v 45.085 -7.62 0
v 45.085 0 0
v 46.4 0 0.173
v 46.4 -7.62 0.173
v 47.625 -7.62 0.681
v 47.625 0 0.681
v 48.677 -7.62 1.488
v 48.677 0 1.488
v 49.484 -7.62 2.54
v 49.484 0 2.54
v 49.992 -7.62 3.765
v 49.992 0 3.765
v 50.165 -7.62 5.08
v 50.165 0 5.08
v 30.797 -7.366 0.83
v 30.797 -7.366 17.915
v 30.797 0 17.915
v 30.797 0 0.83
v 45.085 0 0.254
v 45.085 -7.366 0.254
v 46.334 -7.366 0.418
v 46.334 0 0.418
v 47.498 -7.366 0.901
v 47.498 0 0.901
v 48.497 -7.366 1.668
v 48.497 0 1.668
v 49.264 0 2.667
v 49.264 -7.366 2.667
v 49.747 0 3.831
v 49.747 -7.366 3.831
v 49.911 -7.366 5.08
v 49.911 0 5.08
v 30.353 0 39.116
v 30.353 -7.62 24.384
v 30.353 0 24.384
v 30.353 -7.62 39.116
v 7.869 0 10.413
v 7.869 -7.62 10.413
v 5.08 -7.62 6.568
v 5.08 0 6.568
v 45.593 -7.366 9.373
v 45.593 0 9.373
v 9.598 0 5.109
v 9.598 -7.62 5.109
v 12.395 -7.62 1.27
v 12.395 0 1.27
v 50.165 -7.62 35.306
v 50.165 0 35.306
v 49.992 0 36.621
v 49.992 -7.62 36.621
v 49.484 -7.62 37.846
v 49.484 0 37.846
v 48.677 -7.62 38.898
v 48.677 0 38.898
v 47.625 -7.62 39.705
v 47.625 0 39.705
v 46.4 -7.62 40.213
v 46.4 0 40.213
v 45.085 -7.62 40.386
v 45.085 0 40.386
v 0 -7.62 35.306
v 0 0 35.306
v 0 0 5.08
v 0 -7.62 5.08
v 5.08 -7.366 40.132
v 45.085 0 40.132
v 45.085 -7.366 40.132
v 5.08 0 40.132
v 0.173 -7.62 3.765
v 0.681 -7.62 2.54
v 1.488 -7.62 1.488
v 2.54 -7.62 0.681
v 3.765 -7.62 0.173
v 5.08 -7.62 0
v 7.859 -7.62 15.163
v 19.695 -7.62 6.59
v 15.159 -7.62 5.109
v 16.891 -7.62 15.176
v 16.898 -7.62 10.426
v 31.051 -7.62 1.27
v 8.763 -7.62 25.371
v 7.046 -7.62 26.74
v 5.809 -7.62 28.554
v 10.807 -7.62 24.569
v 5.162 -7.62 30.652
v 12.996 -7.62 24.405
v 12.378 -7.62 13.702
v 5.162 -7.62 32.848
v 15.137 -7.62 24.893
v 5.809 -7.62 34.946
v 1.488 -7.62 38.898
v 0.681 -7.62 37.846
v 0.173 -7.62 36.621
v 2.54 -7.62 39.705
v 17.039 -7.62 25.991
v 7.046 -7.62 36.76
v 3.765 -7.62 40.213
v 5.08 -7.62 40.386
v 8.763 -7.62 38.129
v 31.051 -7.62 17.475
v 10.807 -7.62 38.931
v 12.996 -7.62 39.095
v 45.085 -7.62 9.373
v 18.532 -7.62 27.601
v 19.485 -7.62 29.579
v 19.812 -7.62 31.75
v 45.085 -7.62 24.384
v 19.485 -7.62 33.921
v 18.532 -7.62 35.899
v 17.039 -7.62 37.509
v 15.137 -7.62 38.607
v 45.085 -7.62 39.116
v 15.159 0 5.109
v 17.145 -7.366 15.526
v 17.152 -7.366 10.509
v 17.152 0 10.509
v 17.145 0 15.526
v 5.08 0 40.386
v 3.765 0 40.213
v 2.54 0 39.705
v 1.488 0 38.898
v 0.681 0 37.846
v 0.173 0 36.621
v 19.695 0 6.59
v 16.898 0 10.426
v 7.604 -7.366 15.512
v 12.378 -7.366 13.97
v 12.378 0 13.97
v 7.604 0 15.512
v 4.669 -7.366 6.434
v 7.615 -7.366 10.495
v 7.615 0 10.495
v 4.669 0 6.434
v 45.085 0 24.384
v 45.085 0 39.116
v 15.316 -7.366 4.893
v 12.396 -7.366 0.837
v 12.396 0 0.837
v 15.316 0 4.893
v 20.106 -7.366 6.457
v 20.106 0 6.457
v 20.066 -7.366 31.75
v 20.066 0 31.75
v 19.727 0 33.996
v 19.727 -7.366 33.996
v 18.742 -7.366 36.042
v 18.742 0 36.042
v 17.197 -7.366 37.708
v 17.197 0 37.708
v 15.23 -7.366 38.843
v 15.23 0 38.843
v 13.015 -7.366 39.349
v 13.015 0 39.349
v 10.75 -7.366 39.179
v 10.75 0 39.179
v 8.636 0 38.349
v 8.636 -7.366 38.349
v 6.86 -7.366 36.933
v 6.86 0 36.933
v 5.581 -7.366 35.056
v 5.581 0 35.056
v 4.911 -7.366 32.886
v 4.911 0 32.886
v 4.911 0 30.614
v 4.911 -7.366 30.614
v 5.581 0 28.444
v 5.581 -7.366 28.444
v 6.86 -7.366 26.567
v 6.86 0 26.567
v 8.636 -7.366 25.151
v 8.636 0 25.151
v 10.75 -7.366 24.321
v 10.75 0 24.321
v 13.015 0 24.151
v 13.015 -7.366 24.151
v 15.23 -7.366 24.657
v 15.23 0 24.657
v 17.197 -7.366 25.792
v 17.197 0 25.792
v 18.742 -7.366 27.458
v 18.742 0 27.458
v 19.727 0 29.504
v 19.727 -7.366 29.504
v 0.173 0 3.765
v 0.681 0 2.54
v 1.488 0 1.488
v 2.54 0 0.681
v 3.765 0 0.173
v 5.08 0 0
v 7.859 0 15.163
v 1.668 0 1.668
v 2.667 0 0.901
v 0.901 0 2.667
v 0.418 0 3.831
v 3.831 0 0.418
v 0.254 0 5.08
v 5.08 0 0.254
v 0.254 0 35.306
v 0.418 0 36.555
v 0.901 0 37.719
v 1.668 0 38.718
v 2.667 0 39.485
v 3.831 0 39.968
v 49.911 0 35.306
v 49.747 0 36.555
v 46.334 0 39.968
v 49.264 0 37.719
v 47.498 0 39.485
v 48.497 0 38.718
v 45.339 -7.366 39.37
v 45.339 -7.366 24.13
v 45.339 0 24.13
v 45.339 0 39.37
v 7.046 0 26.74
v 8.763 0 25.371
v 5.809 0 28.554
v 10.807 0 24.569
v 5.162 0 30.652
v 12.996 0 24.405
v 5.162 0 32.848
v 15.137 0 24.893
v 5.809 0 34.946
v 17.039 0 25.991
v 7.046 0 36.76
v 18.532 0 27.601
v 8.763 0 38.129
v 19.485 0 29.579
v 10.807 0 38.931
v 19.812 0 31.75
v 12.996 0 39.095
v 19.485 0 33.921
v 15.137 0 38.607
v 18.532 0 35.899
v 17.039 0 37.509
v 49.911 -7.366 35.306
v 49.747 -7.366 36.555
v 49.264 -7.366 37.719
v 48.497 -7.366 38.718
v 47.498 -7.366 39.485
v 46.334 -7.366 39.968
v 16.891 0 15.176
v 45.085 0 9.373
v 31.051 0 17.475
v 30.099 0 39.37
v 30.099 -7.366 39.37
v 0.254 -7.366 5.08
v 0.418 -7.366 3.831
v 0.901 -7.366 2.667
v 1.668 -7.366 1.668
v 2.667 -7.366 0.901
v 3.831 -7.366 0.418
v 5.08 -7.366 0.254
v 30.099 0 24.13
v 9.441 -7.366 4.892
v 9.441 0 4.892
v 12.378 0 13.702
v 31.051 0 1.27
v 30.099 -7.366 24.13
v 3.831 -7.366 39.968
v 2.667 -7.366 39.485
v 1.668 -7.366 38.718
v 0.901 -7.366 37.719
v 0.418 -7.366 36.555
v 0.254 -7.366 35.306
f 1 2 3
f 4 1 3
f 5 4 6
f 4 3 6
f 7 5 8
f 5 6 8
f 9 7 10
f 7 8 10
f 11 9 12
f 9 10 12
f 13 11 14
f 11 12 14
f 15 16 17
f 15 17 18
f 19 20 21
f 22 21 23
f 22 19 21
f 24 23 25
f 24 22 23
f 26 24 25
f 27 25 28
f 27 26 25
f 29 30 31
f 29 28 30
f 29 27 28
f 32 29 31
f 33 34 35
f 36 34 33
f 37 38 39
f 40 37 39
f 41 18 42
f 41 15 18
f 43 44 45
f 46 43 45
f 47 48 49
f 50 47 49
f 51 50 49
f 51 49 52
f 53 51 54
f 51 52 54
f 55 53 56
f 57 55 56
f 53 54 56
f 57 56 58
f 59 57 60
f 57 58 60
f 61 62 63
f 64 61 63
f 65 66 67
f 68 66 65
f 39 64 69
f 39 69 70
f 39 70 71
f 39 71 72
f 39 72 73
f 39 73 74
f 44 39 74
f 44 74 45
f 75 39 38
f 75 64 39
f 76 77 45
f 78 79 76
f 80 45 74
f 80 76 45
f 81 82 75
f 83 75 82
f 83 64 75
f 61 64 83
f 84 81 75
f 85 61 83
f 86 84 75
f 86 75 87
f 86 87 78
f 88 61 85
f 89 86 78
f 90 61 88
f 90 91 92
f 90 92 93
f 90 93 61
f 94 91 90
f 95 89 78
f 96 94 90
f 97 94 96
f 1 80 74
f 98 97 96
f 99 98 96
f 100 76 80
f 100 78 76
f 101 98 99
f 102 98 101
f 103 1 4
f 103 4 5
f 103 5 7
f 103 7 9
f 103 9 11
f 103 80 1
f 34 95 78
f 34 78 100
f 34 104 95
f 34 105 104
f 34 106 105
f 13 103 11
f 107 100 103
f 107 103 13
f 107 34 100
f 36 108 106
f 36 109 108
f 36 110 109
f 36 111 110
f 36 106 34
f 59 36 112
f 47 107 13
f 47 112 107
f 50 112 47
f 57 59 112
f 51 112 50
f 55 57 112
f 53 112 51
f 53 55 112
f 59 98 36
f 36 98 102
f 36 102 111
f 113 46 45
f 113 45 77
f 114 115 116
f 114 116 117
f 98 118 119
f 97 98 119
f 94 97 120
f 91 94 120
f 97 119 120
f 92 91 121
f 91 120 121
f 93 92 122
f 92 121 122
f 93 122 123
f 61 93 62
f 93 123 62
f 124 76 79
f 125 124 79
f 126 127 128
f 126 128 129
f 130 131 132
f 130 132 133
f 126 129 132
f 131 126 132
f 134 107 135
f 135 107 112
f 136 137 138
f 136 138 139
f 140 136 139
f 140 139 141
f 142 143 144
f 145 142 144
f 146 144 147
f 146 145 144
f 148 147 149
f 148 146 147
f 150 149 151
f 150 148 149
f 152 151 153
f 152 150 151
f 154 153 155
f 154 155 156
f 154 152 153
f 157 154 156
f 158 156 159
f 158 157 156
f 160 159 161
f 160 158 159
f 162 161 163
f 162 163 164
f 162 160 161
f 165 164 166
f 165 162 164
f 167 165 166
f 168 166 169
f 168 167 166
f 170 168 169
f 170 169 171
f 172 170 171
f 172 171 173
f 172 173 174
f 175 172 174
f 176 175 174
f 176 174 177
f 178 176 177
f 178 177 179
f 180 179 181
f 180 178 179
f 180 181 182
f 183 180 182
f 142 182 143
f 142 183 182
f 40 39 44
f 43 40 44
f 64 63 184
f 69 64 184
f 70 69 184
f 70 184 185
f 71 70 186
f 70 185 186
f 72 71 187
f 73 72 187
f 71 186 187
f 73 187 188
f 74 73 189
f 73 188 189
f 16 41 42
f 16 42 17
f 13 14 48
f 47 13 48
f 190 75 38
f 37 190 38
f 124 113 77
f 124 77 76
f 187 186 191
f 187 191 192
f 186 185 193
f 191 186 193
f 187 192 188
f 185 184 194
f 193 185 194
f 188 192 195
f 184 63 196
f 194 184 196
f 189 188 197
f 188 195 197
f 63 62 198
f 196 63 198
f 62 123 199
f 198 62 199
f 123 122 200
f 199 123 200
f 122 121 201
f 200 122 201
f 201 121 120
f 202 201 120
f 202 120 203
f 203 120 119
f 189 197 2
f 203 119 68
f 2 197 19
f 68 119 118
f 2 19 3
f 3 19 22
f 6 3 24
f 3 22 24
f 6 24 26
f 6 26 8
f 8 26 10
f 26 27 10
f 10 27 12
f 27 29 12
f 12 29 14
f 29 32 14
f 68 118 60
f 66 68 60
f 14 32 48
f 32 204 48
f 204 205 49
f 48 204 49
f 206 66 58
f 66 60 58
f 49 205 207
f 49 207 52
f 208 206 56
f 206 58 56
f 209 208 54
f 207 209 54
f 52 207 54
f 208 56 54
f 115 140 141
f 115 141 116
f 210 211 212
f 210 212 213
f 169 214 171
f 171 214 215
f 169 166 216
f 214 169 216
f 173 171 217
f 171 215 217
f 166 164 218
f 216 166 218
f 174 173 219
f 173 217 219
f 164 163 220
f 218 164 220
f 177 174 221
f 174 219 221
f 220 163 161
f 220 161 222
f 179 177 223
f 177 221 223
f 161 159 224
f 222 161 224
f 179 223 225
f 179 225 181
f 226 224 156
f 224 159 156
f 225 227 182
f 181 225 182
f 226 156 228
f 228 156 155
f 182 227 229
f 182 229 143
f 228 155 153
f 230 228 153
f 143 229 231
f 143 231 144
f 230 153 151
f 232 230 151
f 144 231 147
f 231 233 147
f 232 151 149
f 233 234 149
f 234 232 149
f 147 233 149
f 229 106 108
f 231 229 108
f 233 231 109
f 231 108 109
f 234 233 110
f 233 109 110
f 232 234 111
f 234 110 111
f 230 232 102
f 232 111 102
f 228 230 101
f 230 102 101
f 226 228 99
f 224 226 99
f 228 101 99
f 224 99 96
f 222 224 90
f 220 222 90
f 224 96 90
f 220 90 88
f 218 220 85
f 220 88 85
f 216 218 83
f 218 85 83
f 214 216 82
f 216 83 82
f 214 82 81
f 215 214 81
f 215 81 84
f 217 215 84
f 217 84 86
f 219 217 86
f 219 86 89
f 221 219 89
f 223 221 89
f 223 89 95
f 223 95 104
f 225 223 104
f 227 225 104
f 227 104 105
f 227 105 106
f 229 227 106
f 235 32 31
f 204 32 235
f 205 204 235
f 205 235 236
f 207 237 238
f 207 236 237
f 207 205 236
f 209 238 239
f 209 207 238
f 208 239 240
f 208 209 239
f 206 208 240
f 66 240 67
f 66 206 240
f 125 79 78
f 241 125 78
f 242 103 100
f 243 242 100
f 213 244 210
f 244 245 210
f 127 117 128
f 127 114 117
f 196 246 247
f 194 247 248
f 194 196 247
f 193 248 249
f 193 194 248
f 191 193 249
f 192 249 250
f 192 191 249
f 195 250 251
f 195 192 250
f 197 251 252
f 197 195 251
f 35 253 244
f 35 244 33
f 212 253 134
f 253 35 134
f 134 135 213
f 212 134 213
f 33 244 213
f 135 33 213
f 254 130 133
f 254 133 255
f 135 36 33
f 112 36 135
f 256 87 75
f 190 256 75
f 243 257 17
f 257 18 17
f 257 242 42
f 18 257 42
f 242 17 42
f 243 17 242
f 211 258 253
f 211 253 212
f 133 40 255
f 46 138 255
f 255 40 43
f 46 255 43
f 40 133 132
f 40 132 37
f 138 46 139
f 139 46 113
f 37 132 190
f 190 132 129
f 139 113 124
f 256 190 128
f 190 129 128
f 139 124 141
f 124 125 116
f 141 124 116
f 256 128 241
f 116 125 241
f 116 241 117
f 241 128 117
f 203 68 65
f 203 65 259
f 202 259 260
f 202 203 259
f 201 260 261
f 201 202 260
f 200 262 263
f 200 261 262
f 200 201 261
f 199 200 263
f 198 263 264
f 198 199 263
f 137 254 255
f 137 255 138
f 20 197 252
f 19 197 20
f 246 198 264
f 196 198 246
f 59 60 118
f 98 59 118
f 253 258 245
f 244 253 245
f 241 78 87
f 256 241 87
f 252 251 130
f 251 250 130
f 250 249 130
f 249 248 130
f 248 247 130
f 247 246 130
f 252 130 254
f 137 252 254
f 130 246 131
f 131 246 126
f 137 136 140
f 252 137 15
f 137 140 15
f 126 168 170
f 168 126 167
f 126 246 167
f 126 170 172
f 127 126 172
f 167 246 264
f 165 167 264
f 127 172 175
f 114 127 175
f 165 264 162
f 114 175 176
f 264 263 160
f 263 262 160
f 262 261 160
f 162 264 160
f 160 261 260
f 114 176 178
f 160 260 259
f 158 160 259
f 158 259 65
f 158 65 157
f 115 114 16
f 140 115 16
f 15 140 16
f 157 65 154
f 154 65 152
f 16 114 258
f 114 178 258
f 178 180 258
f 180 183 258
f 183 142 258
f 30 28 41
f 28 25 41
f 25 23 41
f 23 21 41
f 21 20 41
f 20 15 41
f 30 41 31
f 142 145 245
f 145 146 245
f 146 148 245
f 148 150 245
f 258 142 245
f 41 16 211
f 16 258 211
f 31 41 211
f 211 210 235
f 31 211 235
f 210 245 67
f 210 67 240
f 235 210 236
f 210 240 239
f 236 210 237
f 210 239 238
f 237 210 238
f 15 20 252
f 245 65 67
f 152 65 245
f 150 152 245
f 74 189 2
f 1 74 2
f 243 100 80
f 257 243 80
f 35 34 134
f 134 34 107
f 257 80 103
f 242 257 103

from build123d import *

# Parameters (mm, degrees)
F1_DEPTH = 7.62
F2_W     = 14.732
F2_H     = 14.732
F5_DEPTH = 25.4
F6_DEPTH = 25.4
F7_DEPTH = 25.4
F8_R     = 7.366
F9_DEPTH = 25.4
F10_T    = -0.254


with BuildPart() as f1:
    # F0 (on Front) → F1 (new body)
    with BuildSketch(Plane.XZ):
        with BuildLine():
            ThreePointArc((0, 5.08), (1.4878975516, 1.4878975516), (5.08, 0))
            Line((5.08, 0), (45.085, 0))
            ThreePointArc((45.085, 0), (48.6771024484, 1.4878975516), (50.165, 5.08))
            Line((50.165, 5.08), (50.165, 35.306))
            ThreePointArc((50.165, 35.306), (48.6771024484, 38.8981024484), (45.085, 40.386))
            Line((45.085, 40.386), (5.08, 40.386))
            ThreePointArc((5.08, 40.386), (1.4878975516, 38.8981024484), (0, 35.306))
            Line((0, 35.306), (0, 5.08))
        make_face()
    extrude(amount=F1_DEPTH)

    # F2 (on face) → F5 (cut)
    with BuildSketch(Plane.XZ.offset(7.62)):
        with Locations((37.719, 31.75)):
            Rectangle(F2_W, F2_H)
    extrude(amount=-F5_DEPTH, mode=Mode.SUBTRACT)

    # F3 (on face) → F6 (cut)
    with BuildSketch(Plane.XZ.offset(7.62)):
        Polygon((31.0508851266, 17.4752), (31.0508851266, 1.27), (45.085, 9.3726), align=None)
    extrude(amount=-F6_DEPTH, mode=Mode.SUBTRACT)

    # F4 (on face) → F7 (cut)
    with BuildSketch(Plane.XZ.offset(7.62)):
        Polygon((9.5977203913, 5.108581493), (12.3952, 1.27), (15.1585802409, 5.108581493), (19.6948698543, 6.5898499511), (16.8980608845, 10.4263776555), (16.8911139309, 15.1761725752), (12.3783031817, 13.7024369881), (7.8586276198, 15.1629618442), (7.8690663965, 10.4131733151), (5.08, 6.5684745393), align=None)
    extrude(amount=-F7_DEPTH, mode=Mode.SUBTRACT)

    # F8 (on face) → F9 (cut)
    with BuildSketch(Plane.XZ.offset(7.62)):
        with Locations((12.446, 31.75)):
            Circle(F8_R)
    extrude(amount=-F9_DEPTH, mode=Mode.SUBTRACT)

    # F10
    f10_openings = [f1.faces().sort_by_distance(p)[0] for p in [
        (24.768491, 0, 18.728729),
    ]]
    offset(amount=F10_T, openings=f10_openings, kind=Kind.INTERSECTION)


solid = f1.part
